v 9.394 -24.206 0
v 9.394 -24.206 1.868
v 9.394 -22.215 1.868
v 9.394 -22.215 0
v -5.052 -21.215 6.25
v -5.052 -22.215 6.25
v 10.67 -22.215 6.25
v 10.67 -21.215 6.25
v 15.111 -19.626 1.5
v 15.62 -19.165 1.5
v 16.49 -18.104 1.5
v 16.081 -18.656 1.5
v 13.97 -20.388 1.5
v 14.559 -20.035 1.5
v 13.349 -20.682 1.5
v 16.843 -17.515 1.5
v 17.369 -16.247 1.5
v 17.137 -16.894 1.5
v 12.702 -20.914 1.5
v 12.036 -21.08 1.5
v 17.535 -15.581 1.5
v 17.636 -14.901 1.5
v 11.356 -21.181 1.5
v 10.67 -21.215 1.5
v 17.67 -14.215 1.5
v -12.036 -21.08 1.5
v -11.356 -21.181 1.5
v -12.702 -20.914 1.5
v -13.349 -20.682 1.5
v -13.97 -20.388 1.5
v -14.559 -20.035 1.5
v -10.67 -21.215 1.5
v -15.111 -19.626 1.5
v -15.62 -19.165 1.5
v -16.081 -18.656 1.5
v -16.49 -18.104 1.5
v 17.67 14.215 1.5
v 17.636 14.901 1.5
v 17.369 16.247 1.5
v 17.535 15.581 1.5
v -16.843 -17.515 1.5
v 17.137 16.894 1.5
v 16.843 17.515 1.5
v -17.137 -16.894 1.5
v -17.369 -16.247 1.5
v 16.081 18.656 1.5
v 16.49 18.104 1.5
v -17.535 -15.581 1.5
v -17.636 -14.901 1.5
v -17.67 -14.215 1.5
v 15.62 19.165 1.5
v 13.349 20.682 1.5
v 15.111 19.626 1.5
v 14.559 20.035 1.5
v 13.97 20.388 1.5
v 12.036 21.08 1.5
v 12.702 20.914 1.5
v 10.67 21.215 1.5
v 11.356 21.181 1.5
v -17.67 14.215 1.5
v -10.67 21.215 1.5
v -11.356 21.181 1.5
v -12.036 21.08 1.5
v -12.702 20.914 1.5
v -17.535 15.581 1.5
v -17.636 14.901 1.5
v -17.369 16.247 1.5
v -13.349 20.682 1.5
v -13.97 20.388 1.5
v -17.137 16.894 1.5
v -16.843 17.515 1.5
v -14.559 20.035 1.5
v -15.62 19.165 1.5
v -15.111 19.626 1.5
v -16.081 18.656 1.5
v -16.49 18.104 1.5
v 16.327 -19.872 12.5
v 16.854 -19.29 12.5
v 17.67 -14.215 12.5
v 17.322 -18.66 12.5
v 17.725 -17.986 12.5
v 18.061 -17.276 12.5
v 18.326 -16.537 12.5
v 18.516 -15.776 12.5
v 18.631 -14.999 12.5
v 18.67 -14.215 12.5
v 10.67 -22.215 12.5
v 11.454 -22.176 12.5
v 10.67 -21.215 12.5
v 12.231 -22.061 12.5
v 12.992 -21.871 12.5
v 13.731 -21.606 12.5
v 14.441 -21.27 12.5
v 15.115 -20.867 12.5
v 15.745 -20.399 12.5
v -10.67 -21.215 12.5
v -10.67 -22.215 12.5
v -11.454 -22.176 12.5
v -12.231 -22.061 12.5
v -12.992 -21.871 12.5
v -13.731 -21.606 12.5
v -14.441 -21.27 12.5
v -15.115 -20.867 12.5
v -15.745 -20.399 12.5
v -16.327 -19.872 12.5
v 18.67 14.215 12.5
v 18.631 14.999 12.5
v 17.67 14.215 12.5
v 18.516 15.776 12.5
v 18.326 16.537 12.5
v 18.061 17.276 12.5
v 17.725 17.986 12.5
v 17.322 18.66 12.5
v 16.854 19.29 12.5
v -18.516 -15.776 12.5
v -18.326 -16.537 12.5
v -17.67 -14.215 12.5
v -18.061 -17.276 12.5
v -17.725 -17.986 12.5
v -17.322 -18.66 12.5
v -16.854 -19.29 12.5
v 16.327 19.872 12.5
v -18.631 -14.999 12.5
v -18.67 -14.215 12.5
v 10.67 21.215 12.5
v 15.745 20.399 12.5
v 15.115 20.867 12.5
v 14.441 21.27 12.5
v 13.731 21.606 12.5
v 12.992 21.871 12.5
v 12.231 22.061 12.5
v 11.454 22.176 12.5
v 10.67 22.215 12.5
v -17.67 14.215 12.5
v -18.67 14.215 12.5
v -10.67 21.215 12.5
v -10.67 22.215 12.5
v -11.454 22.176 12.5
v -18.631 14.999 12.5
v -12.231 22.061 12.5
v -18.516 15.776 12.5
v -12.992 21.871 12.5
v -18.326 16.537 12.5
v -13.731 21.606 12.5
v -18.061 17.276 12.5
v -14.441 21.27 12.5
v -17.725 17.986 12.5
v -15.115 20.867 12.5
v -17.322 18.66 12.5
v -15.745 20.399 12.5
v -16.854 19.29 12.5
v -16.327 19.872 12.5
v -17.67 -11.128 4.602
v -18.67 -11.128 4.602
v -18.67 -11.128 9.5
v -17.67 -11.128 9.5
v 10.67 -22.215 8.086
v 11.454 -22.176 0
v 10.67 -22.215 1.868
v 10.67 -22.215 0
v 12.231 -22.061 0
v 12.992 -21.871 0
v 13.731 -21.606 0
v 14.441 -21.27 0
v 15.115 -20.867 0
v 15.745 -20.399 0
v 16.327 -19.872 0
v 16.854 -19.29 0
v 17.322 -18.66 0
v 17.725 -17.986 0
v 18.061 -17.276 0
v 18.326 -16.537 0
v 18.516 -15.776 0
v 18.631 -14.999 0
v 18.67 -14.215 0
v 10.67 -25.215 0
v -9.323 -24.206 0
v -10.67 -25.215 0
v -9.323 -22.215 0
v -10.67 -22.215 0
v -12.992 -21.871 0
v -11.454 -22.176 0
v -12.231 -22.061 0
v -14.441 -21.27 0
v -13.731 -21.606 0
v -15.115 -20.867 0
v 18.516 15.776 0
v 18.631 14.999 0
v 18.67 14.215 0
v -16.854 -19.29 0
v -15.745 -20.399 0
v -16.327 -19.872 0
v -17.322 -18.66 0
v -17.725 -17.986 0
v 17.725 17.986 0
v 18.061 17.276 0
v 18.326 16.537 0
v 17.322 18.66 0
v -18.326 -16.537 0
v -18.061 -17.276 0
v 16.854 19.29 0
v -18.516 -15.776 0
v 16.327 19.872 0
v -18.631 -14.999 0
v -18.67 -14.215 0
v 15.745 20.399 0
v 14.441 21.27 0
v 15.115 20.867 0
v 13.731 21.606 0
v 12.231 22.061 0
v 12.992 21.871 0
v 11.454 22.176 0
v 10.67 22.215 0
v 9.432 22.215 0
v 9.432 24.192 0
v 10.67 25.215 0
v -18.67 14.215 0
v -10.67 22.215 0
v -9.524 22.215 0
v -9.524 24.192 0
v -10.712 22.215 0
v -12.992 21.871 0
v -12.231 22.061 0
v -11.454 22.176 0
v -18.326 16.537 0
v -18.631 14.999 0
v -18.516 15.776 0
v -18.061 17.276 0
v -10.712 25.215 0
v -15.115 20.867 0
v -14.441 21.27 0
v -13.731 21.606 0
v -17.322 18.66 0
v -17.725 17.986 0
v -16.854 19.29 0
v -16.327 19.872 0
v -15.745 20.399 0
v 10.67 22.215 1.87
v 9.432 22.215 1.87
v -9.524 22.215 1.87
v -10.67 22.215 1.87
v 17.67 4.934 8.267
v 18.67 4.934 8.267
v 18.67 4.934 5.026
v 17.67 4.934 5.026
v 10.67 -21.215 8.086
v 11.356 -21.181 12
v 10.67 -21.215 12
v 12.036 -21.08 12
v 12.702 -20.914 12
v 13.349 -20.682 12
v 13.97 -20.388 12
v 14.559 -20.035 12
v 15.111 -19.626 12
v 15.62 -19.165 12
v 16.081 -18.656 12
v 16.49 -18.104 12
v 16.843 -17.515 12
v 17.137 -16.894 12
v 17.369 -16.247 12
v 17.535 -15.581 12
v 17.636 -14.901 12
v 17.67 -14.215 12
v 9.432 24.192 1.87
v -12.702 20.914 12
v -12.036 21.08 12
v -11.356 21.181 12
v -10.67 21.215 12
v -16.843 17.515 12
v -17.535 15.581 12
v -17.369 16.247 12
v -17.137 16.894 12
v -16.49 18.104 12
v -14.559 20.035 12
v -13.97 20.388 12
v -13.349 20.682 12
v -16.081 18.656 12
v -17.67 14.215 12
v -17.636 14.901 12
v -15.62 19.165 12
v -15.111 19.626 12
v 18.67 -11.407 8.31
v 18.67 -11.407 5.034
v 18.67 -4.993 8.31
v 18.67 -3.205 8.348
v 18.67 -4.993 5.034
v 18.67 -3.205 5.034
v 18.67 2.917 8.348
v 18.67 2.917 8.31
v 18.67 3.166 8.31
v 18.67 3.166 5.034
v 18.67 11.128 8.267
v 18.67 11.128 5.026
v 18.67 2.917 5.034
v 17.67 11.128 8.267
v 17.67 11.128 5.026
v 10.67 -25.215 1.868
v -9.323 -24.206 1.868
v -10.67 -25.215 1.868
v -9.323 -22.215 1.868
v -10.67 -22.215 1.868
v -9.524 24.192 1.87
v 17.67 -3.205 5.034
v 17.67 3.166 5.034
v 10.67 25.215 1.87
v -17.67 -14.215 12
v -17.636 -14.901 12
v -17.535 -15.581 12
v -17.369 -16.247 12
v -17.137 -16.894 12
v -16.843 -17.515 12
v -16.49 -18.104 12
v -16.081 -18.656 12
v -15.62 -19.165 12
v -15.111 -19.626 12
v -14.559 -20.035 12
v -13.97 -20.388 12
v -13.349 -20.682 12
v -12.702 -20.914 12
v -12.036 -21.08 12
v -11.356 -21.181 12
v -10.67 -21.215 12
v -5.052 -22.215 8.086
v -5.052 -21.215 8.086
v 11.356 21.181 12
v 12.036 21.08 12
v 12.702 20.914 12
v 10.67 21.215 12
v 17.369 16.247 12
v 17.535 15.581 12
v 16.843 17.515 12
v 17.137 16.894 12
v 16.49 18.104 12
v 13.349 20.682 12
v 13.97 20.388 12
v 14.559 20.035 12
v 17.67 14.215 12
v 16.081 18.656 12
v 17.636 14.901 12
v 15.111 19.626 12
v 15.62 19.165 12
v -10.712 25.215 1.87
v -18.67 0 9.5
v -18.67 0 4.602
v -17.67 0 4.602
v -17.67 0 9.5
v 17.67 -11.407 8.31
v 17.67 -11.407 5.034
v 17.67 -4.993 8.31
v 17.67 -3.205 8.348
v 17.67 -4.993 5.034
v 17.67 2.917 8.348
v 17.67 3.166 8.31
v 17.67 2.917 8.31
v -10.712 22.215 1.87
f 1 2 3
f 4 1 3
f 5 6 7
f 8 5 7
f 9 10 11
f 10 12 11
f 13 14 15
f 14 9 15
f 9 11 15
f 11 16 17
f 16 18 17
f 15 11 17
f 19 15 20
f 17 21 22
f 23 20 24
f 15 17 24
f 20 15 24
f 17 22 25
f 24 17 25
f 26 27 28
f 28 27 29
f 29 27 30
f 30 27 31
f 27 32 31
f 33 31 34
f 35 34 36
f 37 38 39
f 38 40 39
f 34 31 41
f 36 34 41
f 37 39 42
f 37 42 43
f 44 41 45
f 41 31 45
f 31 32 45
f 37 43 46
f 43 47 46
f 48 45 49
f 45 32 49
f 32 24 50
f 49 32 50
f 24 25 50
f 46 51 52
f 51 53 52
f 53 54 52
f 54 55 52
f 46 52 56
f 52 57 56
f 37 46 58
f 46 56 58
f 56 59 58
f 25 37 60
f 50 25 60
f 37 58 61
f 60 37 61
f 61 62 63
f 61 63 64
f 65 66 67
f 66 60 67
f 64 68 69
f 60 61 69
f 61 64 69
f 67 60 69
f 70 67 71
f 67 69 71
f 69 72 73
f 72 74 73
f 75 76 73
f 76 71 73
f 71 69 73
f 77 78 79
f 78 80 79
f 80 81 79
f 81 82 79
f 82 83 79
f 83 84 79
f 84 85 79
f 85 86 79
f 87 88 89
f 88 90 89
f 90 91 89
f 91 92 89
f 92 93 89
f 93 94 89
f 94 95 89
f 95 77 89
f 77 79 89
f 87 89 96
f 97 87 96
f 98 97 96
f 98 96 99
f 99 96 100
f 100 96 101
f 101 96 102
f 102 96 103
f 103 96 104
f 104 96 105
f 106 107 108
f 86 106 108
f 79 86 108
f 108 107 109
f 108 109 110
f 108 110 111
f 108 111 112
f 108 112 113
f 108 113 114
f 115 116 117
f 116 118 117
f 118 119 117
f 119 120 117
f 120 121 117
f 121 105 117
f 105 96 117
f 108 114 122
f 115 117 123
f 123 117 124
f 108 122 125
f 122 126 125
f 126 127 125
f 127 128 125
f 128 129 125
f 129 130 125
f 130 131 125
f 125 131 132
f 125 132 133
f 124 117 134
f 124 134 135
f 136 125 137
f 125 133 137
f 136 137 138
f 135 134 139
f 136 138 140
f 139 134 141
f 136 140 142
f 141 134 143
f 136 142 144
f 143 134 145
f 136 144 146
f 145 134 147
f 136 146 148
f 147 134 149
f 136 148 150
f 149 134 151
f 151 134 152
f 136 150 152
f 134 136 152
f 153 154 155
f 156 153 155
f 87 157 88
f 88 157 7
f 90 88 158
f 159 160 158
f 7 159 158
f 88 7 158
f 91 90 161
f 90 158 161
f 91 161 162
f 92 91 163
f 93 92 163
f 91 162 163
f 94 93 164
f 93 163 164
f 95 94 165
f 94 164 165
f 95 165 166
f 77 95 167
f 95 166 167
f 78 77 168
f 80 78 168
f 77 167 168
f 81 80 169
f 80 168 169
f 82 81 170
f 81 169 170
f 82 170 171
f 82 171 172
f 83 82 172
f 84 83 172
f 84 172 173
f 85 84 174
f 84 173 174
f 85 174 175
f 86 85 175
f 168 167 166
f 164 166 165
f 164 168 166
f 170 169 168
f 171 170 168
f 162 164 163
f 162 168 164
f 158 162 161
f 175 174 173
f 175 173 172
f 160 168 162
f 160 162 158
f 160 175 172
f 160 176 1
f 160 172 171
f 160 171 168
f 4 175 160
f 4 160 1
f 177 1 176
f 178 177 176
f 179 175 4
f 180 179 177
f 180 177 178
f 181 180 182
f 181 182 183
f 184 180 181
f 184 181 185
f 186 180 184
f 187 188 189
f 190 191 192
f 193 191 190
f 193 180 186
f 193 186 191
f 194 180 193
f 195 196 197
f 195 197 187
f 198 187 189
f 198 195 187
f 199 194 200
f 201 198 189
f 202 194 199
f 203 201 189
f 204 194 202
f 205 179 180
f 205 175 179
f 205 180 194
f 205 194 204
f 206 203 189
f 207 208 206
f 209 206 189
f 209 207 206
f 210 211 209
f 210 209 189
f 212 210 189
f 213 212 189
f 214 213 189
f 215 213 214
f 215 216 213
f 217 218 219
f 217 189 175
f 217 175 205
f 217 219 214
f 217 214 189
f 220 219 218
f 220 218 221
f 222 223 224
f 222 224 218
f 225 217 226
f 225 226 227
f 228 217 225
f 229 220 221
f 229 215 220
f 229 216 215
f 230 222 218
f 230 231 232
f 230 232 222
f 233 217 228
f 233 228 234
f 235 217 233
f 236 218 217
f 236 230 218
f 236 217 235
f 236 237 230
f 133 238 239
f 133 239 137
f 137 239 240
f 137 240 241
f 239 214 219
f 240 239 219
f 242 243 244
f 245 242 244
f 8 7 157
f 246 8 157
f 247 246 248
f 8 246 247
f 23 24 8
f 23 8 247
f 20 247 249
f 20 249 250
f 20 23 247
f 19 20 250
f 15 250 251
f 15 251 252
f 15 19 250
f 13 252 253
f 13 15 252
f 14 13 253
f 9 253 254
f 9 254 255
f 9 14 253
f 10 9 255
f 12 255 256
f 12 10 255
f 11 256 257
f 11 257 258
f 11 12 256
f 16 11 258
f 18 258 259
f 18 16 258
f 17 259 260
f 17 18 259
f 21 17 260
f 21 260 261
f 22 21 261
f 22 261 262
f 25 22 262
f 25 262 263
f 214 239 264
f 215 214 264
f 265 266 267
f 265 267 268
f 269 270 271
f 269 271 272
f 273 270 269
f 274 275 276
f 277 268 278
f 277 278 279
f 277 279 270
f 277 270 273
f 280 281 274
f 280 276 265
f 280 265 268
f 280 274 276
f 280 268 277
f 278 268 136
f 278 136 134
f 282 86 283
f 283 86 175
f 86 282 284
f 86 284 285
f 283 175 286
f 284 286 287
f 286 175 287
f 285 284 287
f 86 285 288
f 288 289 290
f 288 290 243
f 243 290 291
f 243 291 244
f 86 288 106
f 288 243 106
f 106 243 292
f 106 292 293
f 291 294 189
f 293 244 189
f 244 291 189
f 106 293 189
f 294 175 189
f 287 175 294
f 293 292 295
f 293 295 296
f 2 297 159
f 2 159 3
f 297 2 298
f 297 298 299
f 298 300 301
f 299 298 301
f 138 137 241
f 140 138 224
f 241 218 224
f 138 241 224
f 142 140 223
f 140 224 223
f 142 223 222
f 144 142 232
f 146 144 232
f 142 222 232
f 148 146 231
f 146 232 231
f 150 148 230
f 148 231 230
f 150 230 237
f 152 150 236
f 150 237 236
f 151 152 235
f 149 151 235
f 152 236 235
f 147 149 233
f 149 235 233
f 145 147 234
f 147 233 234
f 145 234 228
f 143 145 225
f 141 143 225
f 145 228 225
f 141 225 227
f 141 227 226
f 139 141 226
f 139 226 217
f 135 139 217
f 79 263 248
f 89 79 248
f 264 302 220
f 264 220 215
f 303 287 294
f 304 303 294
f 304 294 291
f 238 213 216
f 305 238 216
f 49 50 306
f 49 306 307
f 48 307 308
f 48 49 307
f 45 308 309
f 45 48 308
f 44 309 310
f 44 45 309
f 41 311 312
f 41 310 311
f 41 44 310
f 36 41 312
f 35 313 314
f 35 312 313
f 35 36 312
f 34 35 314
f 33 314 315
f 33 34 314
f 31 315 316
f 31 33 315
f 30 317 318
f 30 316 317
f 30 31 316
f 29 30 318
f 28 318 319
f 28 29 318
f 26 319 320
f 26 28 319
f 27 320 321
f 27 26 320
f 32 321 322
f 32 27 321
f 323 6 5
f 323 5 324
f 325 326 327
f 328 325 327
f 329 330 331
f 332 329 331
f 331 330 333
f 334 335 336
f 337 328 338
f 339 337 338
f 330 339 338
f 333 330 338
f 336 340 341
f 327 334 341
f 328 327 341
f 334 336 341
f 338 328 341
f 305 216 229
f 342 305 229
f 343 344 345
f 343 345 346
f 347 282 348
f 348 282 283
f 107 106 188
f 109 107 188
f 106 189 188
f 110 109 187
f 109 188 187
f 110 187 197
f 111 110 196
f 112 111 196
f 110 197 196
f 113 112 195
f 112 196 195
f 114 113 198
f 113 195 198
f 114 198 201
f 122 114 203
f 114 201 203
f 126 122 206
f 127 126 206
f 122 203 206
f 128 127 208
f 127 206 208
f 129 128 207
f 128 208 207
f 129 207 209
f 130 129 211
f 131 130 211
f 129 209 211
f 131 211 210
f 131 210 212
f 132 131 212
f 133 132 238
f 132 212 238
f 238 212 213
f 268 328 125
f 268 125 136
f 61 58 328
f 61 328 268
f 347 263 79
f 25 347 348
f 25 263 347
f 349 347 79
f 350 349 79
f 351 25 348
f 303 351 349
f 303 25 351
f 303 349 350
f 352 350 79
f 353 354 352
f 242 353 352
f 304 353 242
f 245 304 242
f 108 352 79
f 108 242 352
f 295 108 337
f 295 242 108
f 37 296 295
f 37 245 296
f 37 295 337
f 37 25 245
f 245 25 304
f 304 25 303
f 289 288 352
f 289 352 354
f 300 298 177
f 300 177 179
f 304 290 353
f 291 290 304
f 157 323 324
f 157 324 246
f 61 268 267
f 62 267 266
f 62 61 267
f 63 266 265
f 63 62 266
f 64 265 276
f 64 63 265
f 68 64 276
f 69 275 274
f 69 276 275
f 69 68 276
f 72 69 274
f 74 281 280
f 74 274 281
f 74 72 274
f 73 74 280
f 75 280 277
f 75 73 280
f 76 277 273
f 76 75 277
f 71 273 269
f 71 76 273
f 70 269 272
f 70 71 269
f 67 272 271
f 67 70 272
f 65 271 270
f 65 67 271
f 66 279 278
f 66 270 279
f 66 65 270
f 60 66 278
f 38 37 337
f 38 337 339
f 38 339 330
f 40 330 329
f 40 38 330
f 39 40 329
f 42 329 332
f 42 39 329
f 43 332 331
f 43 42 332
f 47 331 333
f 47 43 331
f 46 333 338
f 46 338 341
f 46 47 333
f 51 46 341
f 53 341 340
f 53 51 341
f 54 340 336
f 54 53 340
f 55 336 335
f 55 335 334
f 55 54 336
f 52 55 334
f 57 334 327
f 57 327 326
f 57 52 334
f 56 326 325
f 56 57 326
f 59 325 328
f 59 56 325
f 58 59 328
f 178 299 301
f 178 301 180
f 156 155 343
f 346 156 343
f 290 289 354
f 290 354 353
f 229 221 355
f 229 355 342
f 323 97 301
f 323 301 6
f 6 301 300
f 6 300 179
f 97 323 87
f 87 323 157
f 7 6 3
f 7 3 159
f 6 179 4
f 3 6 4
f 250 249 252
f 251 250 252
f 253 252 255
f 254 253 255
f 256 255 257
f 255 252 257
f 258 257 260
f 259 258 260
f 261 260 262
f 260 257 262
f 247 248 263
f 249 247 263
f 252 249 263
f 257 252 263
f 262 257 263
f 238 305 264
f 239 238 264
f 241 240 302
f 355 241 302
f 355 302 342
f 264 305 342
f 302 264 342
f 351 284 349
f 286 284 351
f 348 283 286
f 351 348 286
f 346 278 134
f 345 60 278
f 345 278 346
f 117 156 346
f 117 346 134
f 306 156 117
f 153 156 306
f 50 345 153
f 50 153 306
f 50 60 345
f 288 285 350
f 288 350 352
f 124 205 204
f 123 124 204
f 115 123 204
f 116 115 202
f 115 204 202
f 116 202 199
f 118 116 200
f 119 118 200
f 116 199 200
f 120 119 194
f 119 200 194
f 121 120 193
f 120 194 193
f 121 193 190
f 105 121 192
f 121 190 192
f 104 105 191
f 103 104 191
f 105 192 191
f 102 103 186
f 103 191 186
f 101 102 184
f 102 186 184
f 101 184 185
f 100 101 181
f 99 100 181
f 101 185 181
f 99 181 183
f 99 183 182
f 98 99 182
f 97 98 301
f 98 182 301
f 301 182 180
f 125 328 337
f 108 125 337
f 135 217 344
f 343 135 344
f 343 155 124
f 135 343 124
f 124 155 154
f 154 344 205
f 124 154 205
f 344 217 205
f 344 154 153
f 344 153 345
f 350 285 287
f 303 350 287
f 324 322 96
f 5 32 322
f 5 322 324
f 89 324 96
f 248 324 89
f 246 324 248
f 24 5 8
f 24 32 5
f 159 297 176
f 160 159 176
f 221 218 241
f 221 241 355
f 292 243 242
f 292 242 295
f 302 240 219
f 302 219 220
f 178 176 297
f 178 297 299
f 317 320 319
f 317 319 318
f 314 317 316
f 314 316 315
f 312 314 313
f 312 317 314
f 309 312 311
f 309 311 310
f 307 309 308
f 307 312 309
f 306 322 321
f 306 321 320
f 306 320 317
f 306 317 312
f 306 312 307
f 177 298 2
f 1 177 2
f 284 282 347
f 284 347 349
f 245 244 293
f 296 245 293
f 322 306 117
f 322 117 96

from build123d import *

# Parameters (mm, degrees)
EXTRUDE_2_DEPTH      = 1.5
EXTRUDE_4_DEPTH      = 11
EXTRUDE_START        = -0.5
EXTRUDE_7_DEPTH      = 0.5
EXTRUDE_8_DEPTH      = 0.5
EXTRUDE_9_DEPTH      = 0.5
SKETCH_12_W          = 4.897675457
SKETCH_12_H          = 11.127806736
CUT_EXTRUDE_3_DEPTH  = 3
SKETCH_13_W          = 3.241108758
SKETCH_13_H          = 6.19411896
CUT_EXTRUDE_4_DEPTH  = 3
SKETCH_14_W          = 3.313133397
SKETCH_14_H          = 6.122094321
CUT_EXTRUDE_5_DEPTH  = 3
SKETCH_15_W          = 2.880985563
SKETCH_15_H          = 6.266143599
CUT_EXTRUDE_6_DEPTH  = 3
SKETCH_16_W          = 15.721601541
SKETCH_16_H          = 1.836163931
CUT_EXTRUDE_7_DEPTH  = 3
SKETCH_19_W          = 3.275209086
SKETCH_19_H          = 6.371405254
SKETCH_19_H_2        = 6.414210644
CUT_EXTRUDE_10_DEPTH = 3
EXTRUDE_10_DEPTH     = 0.5
SKETCH_21_W          = 21.34
SKETCH_21_H          = 1.867544815
EXTRUDE_11_DEPTH     = 3
SKETCH_22_W          = 18.717201221
SKETCH_22_H          = 1.991492088
CUT_EXTRUDE_12_DEPTH = 3
SKETCH_23_W          = 21.381625352
SKETCH_23_H          = 3
EXTRUDE_12_DEPTH     = 1.87
SKETCH_24_W          = 18.956438282
SKETCH_24_H          = 1.976854412
CUT_EXTRUDE_13_DEPTH = 1.87


with BuildPart() as part:
    # 草图1 → 凸台-拉伸2 (new body)
    with BuildSketch(Plane.XY):
        with BuildLine():
            Line((-10.67, 22.215), (10.67, 22.215))
            ThreePointArc((10.67, 22.215), (16.326854249, 19.871854249), (18.67, 14.215))
            Line((18.67, 14.215), (18.67, -14.215))
            ThreePointArc((18.67, -14.215), (16.326854249, -19.871854249), (10.67, -22.215))
            Line((10.67, -22.215), (-10.67, -22.215))
            ThreePointArc((-10.67, -22.215), (-16.326854249, -19.871854249), (-18.67, -14.215))
            Line((-18.67, -14.215), (-18.67, 14.215))
            ThreePointArc((-18.67, 14.215), (-16.326854249, 19.871854249), (-10.67, 22.215))
        make_face()
    extrude(amount=EXTRUDE_2_DEPTH)

    # 草图4 → 凸台-拉伸4 (add)
    with BuildSketch(Plane.XY.offset(1.5)):
        with BuildLine():
            Line((18.67, -14.215), (18.67, 14.215))
            ThreePointArc((18.67, 14.215), (16.326854249, 19.871854249), (10.67, 22.215))
            Line((10.67, 22.215), (-10.67, 22.215))
            ThreePointArc((-10.67, 22.215), (-16.326854249, 19.871854249), (-18.67, 14.215))
            Line((-18.67, 14.215), (-18.67, -14.215))
            ThreePointArc((-18.67, -14.215), (-16.326854249, -19.871854249), (-10.67, -22.215))
            Line((-10.67, -22.215), (10.67, -22.215))
            ThreePointArc((10.67, -22.215), (16.326854249, -19.871854249), (18.67, -14.215))
        make_face()
        with BuildLine():
            Line((17.67, -14.215), (17.67, 14.215))
            ThreePointArc((17.67, 14.215), (15.619747468, 19.164747468), (10.67, 21.215))
            Line((10.67, 21.215), (-10.67, 21.215))
            ThreePointArc((-10.67, 21.215), (-15.619747468, 19.164747468), (-17.67, 14.215))
            Line((-17.67, 14.215), (-17.67, -14.215))
            ThreePointArc((-17.67, -14.215), (-15.619747468, -19.164747468), (-10.67, -21.215))
            Line((-10.67, -21.215), (10.67, -21.215))
            ThreePointArc((10.67, -21.215), (15.619747468, -19.164747468), (17.67, -14.215))
        make_face(mode=Mode.SUBTRACT)
    extrude(amount=EXTRUDE_4_DEPTH)

    # 草图8 → 凸台-拉伸7 (add)
    with BuildSketch(Plane.XY.offset(12.5).offset(EXTRUDE_START)):
        with BuildLine():
            Line((-17.67, -14.215), (-10.67, -21.215))
            ThreePointArc((-10.67, -21.215), (-15.619747468, -19.164747468), (-17.67, -14.215))
        make_face()
    extrude(amount=EXTRUDE_7_DEPTH)

    # 草图9 → 凸台-拉伸8 (add)
    with BuildSketch(Plane.XY.offset(12.5).offset(EXTRUDE_START)):
        with BuildLine():
            Line((10.67, 21.215), (17.67, 14.215))
            ThreePointArc((17.67, 14.215), (15.619747468, 19.164747468), (10.67, 21.215))
        make_face()
    extrude(amount=EXTRUDE_8_DEPTH)

    # 草图10 → 凸台-拉伸9 (add)
    with BuildSketch(Plane.XY.offset(12.5).offset(EXTRUDE_START)):
        with BuildLine():
            Line((17.67, -14.215), (10.67, -21.215))
            ThreePointArc((10.67, -21.215), (15.619747468, -19.164747468), (17.67, -14.215))
        make_face()
    extrude(amount=EXTRUDE_9_DEPTH)

    # 草图12 → 切除-拉伸3 (cut)
    with BuildSketch(Plane.ZY.offset(18.67)):
        with Locations((7.050780577, -5.563903368)):
            Rectangle(SKETCH_12_W, SKETCH_12_H)
    extrude(amount=-CUT_EXTRUDE_3_DEPTH, mode=Mode.SUBTRACT)

    # 草图13 → 切除-拉伸4 (cut)
    with BuildSketch(Plane(origin=(18.67, 0, 0), x_dir=(0, 0, -1), z_dir=(1, 0, 0))):
        with Locations((-6.646601976, 8.030747256)):
            Rectangle(SKETCH_13_W, SKETCH_13_H)
    extrude(amount=-CUT_EXTRUDE_4_DEPTH, mode=Mode.SUBTRACT)

    # 草图14 → 切除-拉伸5 (cut)
    with BuildSketch(Plane(origin=(18.67, 0, 0), x_dir=(0, 0, -1), z_dir=(1, 0, 0))):
        with Locations((-6.690937152, -0.144049279)):
            Rectangle(SKETCH_14_W, SKETCH_14_H)
    extrude(amount=-CUT_EXTRUDE_5_DEPTH, mode=Mode.SUBTRACT)

    # 草图15 → 切除-拉伸6 (cut)
    with BuildSketch(Plane(origin=(18.67, 0, 0), x_dir=(0, 0, -1), z_dir=(1, 0, 0))):
        with Locations((-6.664861945, -8.210808854)):
            Rectangle(SKETCH_15_W, SKETCH_15_H)
    extrude(amount=-CUT_EXTRUDE_6_DEPTH, mode=Mode.SUBTRACT)

    # 草图16 → 切除-拉伸7 (cut)
    with BuildSketch(Plane.XZ.offset(22.215)):
        with Locations((2.809199229, 7.168081965)):
            Rectangle(SKETCH_16_W, SKETCH_16_H)
    extrude(amount=-CUT_EXTRUDE_7_DEPTH, mode=Mode.SUBTRACT)

    # 草图19 → 切除-拉伸10 (cut)
    with BuildSketch(Plane(origin=(18.67, 0, 0), x_dir=(0, 0, -1), z_dir=(1, 0, 0))):
        with Locations((-6.671974996, -0.019393812)):
            Rectangle(SKETCH_19_W, SKETCH_19_H)
        with Locations((-6.671974996, -8.200049753)):
            Rectangle(SKETCH_19_W, SKETCH_19_H_2)
    extrude(amount=-CUT_EXTRUDE_10_DEPTH, mode=Mode.SUBTRACT)

    # 草图20 → 凸台-拉伸10 (add)
    with BuildSketch(Plane.XY.offset(12.5).offset(EXTRUDE_START)):
        with BuildLine():
            Line((-10.67, 21.215), (-17.67, 14.215))
            ThreePointArc((-17.67, 14.215), (-15.619747468, 19.164747468), (-10.67, 21.215))
        make_face()
    extrude(amount=EXTRUDE_10_DEPTH)

    # 草图21 → 凸台-拉伸11 (add)
    with BuildSketch(Plane(origin=(0, -22.215, 0), x_dir=(-1, 0, 0), z_dir=(0, -1, 0))):
        with Locations((0, -0.933772408)):
            Rectangle(SKETCH_21_W, SKETCH_21_H)
    extrude(amount=EXTRUDE_11_DEPTH)

    # 草图22 → 切除-拉伸12 (cut)
    with BuildSketch(Plane.XY.offset(1.867544815)):
        with Locations((0.035890498, -23.210746044)):
            Rectangle(SKETCH_22_W, SKETCH_22_H)
    extrude(amount=-CUT_EXTRUDE_12_DEPTH, mode=Mode.SUBTRACT)

    # 草图23 → 凸台-拉伸12 (add)
    with BuildSketch(Plane(origin=(-10.67, -22.215, 0), x_dir=(-1, 0, 0), z_dir=(0, 0, -1))):
        with Locations((-10.649187324, 45.93)):
            Rectangle(SKETCH_23_W, SKETCH_23_H)
    extrude(amount=-EXTRUDE_12_DEPTH)

    # 草图24 → 切除-拉伸13 (cut)
    with BuildSketch(Plane.XY.offset(1.87)):
        with Locations((-0.045973823, 23.203427206)):
            Rectangle(SKETCH_24_W, SKETCH_24_H)
    extrude(amount=-CUT_EXTRUDE_13_DEPTH, mode=Mode.SUBTRACT)


solid = part.part
